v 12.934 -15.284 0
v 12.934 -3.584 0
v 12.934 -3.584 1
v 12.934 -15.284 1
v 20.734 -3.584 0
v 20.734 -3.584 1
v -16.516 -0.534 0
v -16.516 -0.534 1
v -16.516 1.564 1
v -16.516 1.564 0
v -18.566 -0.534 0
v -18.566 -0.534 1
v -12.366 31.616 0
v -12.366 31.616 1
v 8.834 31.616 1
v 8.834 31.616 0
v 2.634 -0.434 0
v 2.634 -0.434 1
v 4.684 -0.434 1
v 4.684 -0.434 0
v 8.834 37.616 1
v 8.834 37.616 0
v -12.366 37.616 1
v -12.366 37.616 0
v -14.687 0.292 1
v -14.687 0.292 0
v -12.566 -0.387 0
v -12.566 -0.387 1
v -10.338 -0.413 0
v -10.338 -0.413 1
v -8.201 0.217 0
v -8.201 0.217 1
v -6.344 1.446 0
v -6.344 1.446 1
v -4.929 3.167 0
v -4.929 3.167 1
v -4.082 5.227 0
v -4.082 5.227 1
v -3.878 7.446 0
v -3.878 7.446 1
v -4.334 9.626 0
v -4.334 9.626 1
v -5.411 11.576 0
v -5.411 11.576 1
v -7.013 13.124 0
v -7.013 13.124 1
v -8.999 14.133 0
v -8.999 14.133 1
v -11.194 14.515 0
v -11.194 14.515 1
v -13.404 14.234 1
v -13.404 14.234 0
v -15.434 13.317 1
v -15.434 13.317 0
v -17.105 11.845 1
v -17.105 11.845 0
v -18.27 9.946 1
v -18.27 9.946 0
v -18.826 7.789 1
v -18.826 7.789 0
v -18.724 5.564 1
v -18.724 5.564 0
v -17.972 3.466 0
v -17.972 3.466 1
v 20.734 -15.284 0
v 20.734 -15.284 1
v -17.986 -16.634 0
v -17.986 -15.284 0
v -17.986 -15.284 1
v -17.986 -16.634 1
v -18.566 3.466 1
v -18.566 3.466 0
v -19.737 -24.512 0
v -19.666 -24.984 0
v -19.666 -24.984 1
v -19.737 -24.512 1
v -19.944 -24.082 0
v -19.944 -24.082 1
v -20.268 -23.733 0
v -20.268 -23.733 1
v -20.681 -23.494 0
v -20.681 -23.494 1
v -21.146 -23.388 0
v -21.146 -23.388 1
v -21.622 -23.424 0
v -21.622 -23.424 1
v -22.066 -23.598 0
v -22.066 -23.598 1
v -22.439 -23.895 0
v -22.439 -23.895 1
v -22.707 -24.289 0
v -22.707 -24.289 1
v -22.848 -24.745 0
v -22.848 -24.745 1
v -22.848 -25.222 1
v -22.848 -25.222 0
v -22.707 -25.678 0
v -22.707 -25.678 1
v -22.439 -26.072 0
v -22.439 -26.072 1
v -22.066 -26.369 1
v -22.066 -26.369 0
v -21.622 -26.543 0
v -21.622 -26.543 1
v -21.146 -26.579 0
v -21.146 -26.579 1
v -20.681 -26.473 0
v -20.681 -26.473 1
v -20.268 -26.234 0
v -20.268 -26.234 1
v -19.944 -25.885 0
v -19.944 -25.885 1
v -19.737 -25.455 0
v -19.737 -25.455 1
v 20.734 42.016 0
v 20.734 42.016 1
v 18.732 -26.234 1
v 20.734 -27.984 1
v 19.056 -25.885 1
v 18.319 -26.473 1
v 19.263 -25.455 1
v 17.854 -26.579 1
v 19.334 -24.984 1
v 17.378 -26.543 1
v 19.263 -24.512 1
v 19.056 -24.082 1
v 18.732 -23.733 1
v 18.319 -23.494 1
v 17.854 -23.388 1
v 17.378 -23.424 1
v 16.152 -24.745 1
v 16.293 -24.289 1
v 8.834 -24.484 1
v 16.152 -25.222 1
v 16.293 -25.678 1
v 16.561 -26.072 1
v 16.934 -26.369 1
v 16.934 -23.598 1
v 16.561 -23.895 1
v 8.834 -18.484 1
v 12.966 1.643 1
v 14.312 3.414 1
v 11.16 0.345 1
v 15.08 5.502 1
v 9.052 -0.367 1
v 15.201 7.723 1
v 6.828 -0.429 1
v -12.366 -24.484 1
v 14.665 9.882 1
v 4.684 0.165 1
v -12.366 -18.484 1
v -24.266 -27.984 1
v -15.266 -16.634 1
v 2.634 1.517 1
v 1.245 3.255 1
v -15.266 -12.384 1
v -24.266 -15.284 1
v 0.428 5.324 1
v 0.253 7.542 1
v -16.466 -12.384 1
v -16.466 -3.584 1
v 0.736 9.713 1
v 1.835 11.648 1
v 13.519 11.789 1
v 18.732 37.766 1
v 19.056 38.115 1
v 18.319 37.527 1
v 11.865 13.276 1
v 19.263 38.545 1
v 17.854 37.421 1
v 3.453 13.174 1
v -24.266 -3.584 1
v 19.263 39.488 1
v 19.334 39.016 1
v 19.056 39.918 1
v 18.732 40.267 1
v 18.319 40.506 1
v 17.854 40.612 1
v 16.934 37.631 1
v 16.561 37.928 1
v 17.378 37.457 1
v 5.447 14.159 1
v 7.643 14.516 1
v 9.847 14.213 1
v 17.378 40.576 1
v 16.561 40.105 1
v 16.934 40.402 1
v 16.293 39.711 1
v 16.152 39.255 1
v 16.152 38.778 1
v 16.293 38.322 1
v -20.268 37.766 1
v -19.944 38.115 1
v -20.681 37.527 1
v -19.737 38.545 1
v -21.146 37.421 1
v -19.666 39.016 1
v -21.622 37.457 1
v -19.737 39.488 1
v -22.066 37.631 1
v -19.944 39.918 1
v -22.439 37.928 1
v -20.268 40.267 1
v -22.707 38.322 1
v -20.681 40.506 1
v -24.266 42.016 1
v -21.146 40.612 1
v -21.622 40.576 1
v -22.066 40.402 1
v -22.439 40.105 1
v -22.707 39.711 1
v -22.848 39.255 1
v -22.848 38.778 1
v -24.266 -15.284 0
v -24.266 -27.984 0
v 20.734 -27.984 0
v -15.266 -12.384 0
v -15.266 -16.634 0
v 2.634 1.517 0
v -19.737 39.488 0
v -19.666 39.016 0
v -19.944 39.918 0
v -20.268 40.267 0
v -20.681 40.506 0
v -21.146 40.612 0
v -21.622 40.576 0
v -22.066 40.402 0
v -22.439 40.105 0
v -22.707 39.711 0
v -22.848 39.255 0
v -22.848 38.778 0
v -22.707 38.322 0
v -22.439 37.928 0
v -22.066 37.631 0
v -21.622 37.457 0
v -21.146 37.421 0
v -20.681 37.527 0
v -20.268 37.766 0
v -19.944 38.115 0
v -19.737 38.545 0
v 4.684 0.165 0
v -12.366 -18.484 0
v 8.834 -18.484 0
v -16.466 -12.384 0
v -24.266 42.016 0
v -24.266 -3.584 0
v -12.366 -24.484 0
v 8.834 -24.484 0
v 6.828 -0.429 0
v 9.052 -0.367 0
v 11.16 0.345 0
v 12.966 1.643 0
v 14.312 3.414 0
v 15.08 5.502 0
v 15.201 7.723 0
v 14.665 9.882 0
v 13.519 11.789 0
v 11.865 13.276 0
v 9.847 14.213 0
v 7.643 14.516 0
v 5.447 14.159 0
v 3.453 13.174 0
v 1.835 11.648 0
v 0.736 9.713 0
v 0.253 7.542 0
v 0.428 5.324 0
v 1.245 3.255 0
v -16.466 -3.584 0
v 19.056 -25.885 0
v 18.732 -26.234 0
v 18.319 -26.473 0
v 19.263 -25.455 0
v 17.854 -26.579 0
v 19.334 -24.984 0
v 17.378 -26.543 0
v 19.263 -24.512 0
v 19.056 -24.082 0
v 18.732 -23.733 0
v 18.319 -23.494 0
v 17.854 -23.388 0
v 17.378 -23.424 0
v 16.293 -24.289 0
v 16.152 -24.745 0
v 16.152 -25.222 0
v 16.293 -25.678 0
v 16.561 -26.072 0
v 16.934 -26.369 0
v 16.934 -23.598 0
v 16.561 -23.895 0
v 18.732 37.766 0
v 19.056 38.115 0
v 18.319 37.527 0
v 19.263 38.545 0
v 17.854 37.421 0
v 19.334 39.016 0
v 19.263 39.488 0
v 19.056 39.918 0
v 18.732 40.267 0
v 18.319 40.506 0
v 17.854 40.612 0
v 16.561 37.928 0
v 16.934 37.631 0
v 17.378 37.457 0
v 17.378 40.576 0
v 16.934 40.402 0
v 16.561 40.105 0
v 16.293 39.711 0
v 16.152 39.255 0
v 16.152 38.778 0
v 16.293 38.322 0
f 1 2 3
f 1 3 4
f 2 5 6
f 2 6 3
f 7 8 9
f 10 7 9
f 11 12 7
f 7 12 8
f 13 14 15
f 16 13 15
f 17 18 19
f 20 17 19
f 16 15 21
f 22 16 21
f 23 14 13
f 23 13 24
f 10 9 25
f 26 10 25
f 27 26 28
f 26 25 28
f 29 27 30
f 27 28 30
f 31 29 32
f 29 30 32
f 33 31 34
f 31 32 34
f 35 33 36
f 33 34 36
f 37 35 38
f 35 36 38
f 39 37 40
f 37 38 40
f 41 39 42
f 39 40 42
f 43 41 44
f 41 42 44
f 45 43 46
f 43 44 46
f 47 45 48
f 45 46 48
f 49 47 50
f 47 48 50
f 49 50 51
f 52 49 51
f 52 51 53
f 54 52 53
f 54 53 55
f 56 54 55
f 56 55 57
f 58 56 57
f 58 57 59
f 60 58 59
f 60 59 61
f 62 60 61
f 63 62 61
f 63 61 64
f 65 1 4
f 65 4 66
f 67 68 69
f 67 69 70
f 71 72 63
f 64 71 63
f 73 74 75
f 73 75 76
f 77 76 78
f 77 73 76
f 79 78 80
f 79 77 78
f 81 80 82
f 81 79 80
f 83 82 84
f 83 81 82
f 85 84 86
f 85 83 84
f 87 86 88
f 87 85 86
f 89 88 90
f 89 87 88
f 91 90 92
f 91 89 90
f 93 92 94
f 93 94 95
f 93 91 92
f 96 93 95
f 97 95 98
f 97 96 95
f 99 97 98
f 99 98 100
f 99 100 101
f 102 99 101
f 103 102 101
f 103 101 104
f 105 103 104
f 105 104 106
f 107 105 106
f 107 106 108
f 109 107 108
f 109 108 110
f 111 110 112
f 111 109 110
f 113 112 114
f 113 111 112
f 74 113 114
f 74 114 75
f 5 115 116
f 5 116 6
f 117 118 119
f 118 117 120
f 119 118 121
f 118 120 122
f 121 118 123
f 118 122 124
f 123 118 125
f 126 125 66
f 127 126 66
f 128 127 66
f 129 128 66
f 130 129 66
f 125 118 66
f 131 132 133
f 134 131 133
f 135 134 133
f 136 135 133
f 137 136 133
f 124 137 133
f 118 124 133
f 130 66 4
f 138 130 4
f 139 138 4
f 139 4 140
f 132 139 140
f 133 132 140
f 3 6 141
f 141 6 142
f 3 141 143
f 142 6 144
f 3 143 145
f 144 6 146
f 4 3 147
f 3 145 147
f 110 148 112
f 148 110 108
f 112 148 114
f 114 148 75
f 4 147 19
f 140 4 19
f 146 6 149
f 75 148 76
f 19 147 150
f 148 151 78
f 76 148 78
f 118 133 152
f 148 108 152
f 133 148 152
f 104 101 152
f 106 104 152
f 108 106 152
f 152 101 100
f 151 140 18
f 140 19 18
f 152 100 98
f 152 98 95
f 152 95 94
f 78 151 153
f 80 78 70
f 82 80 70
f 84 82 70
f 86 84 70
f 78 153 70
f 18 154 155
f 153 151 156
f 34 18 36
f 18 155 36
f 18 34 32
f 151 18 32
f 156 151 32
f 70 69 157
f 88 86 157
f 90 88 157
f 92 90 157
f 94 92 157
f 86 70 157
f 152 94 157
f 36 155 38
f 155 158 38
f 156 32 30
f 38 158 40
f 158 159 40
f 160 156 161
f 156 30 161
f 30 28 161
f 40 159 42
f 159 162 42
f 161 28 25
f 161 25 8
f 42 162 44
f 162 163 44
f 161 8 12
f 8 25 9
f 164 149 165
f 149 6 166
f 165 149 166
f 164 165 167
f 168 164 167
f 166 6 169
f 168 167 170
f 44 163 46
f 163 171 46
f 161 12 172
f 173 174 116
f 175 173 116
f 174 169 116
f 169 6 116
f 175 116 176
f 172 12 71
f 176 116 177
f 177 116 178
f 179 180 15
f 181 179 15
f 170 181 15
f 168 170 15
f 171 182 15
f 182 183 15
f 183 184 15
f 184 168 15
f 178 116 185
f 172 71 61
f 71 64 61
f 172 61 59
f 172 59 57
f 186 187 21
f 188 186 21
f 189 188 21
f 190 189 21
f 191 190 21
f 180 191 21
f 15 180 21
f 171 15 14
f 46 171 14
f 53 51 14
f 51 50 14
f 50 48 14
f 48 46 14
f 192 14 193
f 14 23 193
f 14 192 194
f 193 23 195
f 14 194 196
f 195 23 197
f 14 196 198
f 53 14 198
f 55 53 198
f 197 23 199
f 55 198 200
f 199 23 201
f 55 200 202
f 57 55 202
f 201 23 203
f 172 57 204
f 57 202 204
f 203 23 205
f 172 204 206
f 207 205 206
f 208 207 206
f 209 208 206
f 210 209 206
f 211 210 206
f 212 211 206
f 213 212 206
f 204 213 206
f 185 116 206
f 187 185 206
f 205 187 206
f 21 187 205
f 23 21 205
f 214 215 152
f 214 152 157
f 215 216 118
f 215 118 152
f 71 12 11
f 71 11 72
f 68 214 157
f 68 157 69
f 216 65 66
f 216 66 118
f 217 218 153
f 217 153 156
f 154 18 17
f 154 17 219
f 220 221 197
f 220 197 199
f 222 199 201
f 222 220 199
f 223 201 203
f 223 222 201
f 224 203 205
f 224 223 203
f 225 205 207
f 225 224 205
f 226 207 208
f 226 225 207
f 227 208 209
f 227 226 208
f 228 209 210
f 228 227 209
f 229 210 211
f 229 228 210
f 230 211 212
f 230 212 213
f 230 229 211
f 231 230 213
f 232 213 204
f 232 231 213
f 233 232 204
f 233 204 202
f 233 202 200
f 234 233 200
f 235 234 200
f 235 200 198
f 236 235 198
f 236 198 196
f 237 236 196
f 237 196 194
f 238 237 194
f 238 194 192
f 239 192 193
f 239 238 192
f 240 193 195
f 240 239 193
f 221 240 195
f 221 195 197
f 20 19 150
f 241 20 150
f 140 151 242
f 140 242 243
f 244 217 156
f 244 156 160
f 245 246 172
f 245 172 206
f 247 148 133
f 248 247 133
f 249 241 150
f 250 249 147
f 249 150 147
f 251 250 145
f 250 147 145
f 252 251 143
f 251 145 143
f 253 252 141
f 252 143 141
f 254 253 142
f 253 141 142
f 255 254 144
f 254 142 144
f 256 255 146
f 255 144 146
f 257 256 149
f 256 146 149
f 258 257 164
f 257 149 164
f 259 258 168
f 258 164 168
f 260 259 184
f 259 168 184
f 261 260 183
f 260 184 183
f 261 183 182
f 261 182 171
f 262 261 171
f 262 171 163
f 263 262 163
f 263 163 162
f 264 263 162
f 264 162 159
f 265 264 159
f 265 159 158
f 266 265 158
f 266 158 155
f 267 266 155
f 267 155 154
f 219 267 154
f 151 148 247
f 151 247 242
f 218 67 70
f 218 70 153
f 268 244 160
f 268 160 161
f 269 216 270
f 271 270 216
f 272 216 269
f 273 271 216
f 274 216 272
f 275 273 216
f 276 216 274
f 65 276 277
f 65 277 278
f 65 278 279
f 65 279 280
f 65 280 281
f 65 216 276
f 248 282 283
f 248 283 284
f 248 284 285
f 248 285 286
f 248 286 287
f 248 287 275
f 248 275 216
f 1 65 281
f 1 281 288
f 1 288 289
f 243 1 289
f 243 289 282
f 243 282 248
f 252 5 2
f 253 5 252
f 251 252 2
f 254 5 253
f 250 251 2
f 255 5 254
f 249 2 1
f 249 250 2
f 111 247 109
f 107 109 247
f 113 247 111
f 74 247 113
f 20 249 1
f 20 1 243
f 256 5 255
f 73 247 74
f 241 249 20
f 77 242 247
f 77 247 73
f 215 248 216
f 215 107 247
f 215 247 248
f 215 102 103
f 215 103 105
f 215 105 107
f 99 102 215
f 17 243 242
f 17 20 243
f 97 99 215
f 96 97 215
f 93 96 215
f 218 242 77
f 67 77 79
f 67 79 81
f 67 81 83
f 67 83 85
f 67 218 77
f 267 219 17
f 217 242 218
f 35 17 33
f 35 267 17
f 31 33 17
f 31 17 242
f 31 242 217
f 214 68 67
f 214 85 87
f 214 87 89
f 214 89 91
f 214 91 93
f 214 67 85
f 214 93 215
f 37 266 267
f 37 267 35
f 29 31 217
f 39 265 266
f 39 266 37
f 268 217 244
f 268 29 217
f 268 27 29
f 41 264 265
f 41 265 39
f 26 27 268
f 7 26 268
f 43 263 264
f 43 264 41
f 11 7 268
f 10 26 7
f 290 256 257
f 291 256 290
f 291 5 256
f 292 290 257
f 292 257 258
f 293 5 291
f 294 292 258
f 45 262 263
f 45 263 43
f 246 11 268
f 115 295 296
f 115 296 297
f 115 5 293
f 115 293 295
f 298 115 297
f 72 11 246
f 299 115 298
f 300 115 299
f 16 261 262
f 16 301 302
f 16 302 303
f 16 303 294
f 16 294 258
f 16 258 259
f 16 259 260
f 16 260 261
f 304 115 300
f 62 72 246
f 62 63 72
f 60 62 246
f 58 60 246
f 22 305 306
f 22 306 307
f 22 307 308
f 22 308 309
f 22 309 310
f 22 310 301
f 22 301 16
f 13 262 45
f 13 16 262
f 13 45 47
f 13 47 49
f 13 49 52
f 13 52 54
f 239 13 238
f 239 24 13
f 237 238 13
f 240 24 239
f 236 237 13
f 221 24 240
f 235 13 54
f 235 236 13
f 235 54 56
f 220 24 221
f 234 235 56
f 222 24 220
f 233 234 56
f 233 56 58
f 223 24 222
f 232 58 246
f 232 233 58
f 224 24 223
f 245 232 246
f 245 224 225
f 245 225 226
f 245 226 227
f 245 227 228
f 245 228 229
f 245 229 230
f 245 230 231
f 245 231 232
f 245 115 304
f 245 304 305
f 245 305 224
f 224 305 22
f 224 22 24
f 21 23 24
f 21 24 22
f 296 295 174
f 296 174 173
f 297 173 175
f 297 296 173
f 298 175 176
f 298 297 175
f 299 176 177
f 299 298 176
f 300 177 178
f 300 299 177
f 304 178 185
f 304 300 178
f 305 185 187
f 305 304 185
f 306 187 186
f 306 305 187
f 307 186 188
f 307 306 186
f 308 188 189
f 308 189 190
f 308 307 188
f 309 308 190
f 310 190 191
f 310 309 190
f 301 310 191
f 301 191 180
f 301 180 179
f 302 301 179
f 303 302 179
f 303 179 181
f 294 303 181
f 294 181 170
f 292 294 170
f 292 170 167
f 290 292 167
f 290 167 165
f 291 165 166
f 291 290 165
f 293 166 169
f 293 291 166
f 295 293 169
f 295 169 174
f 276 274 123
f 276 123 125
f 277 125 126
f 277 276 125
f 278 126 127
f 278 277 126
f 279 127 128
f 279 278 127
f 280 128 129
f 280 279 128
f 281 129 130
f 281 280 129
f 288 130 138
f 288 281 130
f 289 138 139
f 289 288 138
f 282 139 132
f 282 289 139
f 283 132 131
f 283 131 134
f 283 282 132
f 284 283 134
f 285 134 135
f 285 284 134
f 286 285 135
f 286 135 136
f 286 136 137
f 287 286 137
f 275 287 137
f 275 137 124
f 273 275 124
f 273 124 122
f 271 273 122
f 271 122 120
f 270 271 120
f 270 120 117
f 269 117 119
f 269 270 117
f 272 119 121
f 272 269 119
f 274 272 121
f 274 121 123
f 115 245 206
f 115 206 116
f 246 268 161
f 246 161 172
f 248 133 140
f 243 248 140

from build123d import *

# Parameters (mm, degrees)
SKETCH1_R           = 1.6
BOSS_EXTRUDE1_DEPTH = 1
SKETCH5_W           = 2.05
SKETCH5_H           = 4
CUT_EXTRUDE1_DEPTH  = 4
SKETCH4_W           = 21.2
SKETCH4_H           = 6
CUT_EXTRUDE2_DEPTH  = 4
SKETCH2_R           = 7.5
CUT_EXTRUDE3_DEPTH  = 4


with BuildPart() as part:
    # Sketch1 → Boss-Extrude1 (new body)
    with BuildSketch(Plane.XY):
        Polygon((20.734205703, -15.283501687), (20.734205703, -27.983501687), (-24.265794297, -27.983501687), (-24.265794297, -15.283501687), (-17.985794297, -15.283501687), (-17.985794297, -16.633501687), (-15.265794297, -16.633501687), (-15.265794297, -12.383501687), (-16.465794297, -12.383501687), (-16.465794297, -3.583501687), (-24.265794297, -3.583501687), (-24.265794297, 42.016498313), (20.734205703, 42.016498313), (20.734205703, -3.583501687), (12.934205703, -3.583501687), (12.934205703, -15.283501687), align=None)
        with Locations((-21.265794297, 39.016498313)):
            Circle(SKETCH1_R, mode=Mode.SUBTRACT)
        with Locations((17.734205703, 39.016498313)):
            Circle(SKETCH1_R, mode=Mode.SUBTRACT)
        with Locations((-21.265794297, -24.983501687)):
            Circle(SKETCH1_R, mode=Mode.SUBTRACT)
        with Locations((17.734205703, -24.983501687)):
            Circle(SKETCH1_R, mode=Mode.SUBTRACT)
    extrude(amount=BOSS_EXTRUDE1_DEPTH)

    # Sketch5 → Cut-Extrude1 (cut)
    with BuildSketch(Plane.XY.offset(1)):
        with Locations((-17.540794297, 1.466498313)):
            Rectangle(SKETCH5_W, SKETCH5_H)
        with Locations((3.659205703, 1.566498313)):
            Rectangle(SKETCH5_W, SKETCH5_H)
    extrude(amount=-CUT_EXTRUDE1_DEPTH, mode=Mode.SUBTRACT)

    # Sketch4 → Cut-Extrude2 (cut)
    with BuildSketch(Plane.XY.offset(1)):
        with Locations((-1.765794297, -21.483501687)):
            Rectangle(SKETCH4_W, SKETCH4_H)
        with Locations((-1.765794297, 34.616498313)):
            Rectangle(SKETCH4_W, SKETCH4_H)
    extrude(amount=-CUT_EXTRUDE2_DEPTH, mode=Mode.SUBTRACT)

    # Sketch2 → Cut-Extrude3 (cut)
    with BuildSketch(Plane.XY.offset(1)):
        with Locations((-11.365794297, 7.016498313)):
            Circle(SKETCH2_R)
        with Locations((7.734205703, 7.016498313)):
            Circle(SKETCH2_R)
    extrude(amount=-CUT_EXTRUDE3_DEPTH, mode=Mode.SUBTRACT)


solid = part.part
